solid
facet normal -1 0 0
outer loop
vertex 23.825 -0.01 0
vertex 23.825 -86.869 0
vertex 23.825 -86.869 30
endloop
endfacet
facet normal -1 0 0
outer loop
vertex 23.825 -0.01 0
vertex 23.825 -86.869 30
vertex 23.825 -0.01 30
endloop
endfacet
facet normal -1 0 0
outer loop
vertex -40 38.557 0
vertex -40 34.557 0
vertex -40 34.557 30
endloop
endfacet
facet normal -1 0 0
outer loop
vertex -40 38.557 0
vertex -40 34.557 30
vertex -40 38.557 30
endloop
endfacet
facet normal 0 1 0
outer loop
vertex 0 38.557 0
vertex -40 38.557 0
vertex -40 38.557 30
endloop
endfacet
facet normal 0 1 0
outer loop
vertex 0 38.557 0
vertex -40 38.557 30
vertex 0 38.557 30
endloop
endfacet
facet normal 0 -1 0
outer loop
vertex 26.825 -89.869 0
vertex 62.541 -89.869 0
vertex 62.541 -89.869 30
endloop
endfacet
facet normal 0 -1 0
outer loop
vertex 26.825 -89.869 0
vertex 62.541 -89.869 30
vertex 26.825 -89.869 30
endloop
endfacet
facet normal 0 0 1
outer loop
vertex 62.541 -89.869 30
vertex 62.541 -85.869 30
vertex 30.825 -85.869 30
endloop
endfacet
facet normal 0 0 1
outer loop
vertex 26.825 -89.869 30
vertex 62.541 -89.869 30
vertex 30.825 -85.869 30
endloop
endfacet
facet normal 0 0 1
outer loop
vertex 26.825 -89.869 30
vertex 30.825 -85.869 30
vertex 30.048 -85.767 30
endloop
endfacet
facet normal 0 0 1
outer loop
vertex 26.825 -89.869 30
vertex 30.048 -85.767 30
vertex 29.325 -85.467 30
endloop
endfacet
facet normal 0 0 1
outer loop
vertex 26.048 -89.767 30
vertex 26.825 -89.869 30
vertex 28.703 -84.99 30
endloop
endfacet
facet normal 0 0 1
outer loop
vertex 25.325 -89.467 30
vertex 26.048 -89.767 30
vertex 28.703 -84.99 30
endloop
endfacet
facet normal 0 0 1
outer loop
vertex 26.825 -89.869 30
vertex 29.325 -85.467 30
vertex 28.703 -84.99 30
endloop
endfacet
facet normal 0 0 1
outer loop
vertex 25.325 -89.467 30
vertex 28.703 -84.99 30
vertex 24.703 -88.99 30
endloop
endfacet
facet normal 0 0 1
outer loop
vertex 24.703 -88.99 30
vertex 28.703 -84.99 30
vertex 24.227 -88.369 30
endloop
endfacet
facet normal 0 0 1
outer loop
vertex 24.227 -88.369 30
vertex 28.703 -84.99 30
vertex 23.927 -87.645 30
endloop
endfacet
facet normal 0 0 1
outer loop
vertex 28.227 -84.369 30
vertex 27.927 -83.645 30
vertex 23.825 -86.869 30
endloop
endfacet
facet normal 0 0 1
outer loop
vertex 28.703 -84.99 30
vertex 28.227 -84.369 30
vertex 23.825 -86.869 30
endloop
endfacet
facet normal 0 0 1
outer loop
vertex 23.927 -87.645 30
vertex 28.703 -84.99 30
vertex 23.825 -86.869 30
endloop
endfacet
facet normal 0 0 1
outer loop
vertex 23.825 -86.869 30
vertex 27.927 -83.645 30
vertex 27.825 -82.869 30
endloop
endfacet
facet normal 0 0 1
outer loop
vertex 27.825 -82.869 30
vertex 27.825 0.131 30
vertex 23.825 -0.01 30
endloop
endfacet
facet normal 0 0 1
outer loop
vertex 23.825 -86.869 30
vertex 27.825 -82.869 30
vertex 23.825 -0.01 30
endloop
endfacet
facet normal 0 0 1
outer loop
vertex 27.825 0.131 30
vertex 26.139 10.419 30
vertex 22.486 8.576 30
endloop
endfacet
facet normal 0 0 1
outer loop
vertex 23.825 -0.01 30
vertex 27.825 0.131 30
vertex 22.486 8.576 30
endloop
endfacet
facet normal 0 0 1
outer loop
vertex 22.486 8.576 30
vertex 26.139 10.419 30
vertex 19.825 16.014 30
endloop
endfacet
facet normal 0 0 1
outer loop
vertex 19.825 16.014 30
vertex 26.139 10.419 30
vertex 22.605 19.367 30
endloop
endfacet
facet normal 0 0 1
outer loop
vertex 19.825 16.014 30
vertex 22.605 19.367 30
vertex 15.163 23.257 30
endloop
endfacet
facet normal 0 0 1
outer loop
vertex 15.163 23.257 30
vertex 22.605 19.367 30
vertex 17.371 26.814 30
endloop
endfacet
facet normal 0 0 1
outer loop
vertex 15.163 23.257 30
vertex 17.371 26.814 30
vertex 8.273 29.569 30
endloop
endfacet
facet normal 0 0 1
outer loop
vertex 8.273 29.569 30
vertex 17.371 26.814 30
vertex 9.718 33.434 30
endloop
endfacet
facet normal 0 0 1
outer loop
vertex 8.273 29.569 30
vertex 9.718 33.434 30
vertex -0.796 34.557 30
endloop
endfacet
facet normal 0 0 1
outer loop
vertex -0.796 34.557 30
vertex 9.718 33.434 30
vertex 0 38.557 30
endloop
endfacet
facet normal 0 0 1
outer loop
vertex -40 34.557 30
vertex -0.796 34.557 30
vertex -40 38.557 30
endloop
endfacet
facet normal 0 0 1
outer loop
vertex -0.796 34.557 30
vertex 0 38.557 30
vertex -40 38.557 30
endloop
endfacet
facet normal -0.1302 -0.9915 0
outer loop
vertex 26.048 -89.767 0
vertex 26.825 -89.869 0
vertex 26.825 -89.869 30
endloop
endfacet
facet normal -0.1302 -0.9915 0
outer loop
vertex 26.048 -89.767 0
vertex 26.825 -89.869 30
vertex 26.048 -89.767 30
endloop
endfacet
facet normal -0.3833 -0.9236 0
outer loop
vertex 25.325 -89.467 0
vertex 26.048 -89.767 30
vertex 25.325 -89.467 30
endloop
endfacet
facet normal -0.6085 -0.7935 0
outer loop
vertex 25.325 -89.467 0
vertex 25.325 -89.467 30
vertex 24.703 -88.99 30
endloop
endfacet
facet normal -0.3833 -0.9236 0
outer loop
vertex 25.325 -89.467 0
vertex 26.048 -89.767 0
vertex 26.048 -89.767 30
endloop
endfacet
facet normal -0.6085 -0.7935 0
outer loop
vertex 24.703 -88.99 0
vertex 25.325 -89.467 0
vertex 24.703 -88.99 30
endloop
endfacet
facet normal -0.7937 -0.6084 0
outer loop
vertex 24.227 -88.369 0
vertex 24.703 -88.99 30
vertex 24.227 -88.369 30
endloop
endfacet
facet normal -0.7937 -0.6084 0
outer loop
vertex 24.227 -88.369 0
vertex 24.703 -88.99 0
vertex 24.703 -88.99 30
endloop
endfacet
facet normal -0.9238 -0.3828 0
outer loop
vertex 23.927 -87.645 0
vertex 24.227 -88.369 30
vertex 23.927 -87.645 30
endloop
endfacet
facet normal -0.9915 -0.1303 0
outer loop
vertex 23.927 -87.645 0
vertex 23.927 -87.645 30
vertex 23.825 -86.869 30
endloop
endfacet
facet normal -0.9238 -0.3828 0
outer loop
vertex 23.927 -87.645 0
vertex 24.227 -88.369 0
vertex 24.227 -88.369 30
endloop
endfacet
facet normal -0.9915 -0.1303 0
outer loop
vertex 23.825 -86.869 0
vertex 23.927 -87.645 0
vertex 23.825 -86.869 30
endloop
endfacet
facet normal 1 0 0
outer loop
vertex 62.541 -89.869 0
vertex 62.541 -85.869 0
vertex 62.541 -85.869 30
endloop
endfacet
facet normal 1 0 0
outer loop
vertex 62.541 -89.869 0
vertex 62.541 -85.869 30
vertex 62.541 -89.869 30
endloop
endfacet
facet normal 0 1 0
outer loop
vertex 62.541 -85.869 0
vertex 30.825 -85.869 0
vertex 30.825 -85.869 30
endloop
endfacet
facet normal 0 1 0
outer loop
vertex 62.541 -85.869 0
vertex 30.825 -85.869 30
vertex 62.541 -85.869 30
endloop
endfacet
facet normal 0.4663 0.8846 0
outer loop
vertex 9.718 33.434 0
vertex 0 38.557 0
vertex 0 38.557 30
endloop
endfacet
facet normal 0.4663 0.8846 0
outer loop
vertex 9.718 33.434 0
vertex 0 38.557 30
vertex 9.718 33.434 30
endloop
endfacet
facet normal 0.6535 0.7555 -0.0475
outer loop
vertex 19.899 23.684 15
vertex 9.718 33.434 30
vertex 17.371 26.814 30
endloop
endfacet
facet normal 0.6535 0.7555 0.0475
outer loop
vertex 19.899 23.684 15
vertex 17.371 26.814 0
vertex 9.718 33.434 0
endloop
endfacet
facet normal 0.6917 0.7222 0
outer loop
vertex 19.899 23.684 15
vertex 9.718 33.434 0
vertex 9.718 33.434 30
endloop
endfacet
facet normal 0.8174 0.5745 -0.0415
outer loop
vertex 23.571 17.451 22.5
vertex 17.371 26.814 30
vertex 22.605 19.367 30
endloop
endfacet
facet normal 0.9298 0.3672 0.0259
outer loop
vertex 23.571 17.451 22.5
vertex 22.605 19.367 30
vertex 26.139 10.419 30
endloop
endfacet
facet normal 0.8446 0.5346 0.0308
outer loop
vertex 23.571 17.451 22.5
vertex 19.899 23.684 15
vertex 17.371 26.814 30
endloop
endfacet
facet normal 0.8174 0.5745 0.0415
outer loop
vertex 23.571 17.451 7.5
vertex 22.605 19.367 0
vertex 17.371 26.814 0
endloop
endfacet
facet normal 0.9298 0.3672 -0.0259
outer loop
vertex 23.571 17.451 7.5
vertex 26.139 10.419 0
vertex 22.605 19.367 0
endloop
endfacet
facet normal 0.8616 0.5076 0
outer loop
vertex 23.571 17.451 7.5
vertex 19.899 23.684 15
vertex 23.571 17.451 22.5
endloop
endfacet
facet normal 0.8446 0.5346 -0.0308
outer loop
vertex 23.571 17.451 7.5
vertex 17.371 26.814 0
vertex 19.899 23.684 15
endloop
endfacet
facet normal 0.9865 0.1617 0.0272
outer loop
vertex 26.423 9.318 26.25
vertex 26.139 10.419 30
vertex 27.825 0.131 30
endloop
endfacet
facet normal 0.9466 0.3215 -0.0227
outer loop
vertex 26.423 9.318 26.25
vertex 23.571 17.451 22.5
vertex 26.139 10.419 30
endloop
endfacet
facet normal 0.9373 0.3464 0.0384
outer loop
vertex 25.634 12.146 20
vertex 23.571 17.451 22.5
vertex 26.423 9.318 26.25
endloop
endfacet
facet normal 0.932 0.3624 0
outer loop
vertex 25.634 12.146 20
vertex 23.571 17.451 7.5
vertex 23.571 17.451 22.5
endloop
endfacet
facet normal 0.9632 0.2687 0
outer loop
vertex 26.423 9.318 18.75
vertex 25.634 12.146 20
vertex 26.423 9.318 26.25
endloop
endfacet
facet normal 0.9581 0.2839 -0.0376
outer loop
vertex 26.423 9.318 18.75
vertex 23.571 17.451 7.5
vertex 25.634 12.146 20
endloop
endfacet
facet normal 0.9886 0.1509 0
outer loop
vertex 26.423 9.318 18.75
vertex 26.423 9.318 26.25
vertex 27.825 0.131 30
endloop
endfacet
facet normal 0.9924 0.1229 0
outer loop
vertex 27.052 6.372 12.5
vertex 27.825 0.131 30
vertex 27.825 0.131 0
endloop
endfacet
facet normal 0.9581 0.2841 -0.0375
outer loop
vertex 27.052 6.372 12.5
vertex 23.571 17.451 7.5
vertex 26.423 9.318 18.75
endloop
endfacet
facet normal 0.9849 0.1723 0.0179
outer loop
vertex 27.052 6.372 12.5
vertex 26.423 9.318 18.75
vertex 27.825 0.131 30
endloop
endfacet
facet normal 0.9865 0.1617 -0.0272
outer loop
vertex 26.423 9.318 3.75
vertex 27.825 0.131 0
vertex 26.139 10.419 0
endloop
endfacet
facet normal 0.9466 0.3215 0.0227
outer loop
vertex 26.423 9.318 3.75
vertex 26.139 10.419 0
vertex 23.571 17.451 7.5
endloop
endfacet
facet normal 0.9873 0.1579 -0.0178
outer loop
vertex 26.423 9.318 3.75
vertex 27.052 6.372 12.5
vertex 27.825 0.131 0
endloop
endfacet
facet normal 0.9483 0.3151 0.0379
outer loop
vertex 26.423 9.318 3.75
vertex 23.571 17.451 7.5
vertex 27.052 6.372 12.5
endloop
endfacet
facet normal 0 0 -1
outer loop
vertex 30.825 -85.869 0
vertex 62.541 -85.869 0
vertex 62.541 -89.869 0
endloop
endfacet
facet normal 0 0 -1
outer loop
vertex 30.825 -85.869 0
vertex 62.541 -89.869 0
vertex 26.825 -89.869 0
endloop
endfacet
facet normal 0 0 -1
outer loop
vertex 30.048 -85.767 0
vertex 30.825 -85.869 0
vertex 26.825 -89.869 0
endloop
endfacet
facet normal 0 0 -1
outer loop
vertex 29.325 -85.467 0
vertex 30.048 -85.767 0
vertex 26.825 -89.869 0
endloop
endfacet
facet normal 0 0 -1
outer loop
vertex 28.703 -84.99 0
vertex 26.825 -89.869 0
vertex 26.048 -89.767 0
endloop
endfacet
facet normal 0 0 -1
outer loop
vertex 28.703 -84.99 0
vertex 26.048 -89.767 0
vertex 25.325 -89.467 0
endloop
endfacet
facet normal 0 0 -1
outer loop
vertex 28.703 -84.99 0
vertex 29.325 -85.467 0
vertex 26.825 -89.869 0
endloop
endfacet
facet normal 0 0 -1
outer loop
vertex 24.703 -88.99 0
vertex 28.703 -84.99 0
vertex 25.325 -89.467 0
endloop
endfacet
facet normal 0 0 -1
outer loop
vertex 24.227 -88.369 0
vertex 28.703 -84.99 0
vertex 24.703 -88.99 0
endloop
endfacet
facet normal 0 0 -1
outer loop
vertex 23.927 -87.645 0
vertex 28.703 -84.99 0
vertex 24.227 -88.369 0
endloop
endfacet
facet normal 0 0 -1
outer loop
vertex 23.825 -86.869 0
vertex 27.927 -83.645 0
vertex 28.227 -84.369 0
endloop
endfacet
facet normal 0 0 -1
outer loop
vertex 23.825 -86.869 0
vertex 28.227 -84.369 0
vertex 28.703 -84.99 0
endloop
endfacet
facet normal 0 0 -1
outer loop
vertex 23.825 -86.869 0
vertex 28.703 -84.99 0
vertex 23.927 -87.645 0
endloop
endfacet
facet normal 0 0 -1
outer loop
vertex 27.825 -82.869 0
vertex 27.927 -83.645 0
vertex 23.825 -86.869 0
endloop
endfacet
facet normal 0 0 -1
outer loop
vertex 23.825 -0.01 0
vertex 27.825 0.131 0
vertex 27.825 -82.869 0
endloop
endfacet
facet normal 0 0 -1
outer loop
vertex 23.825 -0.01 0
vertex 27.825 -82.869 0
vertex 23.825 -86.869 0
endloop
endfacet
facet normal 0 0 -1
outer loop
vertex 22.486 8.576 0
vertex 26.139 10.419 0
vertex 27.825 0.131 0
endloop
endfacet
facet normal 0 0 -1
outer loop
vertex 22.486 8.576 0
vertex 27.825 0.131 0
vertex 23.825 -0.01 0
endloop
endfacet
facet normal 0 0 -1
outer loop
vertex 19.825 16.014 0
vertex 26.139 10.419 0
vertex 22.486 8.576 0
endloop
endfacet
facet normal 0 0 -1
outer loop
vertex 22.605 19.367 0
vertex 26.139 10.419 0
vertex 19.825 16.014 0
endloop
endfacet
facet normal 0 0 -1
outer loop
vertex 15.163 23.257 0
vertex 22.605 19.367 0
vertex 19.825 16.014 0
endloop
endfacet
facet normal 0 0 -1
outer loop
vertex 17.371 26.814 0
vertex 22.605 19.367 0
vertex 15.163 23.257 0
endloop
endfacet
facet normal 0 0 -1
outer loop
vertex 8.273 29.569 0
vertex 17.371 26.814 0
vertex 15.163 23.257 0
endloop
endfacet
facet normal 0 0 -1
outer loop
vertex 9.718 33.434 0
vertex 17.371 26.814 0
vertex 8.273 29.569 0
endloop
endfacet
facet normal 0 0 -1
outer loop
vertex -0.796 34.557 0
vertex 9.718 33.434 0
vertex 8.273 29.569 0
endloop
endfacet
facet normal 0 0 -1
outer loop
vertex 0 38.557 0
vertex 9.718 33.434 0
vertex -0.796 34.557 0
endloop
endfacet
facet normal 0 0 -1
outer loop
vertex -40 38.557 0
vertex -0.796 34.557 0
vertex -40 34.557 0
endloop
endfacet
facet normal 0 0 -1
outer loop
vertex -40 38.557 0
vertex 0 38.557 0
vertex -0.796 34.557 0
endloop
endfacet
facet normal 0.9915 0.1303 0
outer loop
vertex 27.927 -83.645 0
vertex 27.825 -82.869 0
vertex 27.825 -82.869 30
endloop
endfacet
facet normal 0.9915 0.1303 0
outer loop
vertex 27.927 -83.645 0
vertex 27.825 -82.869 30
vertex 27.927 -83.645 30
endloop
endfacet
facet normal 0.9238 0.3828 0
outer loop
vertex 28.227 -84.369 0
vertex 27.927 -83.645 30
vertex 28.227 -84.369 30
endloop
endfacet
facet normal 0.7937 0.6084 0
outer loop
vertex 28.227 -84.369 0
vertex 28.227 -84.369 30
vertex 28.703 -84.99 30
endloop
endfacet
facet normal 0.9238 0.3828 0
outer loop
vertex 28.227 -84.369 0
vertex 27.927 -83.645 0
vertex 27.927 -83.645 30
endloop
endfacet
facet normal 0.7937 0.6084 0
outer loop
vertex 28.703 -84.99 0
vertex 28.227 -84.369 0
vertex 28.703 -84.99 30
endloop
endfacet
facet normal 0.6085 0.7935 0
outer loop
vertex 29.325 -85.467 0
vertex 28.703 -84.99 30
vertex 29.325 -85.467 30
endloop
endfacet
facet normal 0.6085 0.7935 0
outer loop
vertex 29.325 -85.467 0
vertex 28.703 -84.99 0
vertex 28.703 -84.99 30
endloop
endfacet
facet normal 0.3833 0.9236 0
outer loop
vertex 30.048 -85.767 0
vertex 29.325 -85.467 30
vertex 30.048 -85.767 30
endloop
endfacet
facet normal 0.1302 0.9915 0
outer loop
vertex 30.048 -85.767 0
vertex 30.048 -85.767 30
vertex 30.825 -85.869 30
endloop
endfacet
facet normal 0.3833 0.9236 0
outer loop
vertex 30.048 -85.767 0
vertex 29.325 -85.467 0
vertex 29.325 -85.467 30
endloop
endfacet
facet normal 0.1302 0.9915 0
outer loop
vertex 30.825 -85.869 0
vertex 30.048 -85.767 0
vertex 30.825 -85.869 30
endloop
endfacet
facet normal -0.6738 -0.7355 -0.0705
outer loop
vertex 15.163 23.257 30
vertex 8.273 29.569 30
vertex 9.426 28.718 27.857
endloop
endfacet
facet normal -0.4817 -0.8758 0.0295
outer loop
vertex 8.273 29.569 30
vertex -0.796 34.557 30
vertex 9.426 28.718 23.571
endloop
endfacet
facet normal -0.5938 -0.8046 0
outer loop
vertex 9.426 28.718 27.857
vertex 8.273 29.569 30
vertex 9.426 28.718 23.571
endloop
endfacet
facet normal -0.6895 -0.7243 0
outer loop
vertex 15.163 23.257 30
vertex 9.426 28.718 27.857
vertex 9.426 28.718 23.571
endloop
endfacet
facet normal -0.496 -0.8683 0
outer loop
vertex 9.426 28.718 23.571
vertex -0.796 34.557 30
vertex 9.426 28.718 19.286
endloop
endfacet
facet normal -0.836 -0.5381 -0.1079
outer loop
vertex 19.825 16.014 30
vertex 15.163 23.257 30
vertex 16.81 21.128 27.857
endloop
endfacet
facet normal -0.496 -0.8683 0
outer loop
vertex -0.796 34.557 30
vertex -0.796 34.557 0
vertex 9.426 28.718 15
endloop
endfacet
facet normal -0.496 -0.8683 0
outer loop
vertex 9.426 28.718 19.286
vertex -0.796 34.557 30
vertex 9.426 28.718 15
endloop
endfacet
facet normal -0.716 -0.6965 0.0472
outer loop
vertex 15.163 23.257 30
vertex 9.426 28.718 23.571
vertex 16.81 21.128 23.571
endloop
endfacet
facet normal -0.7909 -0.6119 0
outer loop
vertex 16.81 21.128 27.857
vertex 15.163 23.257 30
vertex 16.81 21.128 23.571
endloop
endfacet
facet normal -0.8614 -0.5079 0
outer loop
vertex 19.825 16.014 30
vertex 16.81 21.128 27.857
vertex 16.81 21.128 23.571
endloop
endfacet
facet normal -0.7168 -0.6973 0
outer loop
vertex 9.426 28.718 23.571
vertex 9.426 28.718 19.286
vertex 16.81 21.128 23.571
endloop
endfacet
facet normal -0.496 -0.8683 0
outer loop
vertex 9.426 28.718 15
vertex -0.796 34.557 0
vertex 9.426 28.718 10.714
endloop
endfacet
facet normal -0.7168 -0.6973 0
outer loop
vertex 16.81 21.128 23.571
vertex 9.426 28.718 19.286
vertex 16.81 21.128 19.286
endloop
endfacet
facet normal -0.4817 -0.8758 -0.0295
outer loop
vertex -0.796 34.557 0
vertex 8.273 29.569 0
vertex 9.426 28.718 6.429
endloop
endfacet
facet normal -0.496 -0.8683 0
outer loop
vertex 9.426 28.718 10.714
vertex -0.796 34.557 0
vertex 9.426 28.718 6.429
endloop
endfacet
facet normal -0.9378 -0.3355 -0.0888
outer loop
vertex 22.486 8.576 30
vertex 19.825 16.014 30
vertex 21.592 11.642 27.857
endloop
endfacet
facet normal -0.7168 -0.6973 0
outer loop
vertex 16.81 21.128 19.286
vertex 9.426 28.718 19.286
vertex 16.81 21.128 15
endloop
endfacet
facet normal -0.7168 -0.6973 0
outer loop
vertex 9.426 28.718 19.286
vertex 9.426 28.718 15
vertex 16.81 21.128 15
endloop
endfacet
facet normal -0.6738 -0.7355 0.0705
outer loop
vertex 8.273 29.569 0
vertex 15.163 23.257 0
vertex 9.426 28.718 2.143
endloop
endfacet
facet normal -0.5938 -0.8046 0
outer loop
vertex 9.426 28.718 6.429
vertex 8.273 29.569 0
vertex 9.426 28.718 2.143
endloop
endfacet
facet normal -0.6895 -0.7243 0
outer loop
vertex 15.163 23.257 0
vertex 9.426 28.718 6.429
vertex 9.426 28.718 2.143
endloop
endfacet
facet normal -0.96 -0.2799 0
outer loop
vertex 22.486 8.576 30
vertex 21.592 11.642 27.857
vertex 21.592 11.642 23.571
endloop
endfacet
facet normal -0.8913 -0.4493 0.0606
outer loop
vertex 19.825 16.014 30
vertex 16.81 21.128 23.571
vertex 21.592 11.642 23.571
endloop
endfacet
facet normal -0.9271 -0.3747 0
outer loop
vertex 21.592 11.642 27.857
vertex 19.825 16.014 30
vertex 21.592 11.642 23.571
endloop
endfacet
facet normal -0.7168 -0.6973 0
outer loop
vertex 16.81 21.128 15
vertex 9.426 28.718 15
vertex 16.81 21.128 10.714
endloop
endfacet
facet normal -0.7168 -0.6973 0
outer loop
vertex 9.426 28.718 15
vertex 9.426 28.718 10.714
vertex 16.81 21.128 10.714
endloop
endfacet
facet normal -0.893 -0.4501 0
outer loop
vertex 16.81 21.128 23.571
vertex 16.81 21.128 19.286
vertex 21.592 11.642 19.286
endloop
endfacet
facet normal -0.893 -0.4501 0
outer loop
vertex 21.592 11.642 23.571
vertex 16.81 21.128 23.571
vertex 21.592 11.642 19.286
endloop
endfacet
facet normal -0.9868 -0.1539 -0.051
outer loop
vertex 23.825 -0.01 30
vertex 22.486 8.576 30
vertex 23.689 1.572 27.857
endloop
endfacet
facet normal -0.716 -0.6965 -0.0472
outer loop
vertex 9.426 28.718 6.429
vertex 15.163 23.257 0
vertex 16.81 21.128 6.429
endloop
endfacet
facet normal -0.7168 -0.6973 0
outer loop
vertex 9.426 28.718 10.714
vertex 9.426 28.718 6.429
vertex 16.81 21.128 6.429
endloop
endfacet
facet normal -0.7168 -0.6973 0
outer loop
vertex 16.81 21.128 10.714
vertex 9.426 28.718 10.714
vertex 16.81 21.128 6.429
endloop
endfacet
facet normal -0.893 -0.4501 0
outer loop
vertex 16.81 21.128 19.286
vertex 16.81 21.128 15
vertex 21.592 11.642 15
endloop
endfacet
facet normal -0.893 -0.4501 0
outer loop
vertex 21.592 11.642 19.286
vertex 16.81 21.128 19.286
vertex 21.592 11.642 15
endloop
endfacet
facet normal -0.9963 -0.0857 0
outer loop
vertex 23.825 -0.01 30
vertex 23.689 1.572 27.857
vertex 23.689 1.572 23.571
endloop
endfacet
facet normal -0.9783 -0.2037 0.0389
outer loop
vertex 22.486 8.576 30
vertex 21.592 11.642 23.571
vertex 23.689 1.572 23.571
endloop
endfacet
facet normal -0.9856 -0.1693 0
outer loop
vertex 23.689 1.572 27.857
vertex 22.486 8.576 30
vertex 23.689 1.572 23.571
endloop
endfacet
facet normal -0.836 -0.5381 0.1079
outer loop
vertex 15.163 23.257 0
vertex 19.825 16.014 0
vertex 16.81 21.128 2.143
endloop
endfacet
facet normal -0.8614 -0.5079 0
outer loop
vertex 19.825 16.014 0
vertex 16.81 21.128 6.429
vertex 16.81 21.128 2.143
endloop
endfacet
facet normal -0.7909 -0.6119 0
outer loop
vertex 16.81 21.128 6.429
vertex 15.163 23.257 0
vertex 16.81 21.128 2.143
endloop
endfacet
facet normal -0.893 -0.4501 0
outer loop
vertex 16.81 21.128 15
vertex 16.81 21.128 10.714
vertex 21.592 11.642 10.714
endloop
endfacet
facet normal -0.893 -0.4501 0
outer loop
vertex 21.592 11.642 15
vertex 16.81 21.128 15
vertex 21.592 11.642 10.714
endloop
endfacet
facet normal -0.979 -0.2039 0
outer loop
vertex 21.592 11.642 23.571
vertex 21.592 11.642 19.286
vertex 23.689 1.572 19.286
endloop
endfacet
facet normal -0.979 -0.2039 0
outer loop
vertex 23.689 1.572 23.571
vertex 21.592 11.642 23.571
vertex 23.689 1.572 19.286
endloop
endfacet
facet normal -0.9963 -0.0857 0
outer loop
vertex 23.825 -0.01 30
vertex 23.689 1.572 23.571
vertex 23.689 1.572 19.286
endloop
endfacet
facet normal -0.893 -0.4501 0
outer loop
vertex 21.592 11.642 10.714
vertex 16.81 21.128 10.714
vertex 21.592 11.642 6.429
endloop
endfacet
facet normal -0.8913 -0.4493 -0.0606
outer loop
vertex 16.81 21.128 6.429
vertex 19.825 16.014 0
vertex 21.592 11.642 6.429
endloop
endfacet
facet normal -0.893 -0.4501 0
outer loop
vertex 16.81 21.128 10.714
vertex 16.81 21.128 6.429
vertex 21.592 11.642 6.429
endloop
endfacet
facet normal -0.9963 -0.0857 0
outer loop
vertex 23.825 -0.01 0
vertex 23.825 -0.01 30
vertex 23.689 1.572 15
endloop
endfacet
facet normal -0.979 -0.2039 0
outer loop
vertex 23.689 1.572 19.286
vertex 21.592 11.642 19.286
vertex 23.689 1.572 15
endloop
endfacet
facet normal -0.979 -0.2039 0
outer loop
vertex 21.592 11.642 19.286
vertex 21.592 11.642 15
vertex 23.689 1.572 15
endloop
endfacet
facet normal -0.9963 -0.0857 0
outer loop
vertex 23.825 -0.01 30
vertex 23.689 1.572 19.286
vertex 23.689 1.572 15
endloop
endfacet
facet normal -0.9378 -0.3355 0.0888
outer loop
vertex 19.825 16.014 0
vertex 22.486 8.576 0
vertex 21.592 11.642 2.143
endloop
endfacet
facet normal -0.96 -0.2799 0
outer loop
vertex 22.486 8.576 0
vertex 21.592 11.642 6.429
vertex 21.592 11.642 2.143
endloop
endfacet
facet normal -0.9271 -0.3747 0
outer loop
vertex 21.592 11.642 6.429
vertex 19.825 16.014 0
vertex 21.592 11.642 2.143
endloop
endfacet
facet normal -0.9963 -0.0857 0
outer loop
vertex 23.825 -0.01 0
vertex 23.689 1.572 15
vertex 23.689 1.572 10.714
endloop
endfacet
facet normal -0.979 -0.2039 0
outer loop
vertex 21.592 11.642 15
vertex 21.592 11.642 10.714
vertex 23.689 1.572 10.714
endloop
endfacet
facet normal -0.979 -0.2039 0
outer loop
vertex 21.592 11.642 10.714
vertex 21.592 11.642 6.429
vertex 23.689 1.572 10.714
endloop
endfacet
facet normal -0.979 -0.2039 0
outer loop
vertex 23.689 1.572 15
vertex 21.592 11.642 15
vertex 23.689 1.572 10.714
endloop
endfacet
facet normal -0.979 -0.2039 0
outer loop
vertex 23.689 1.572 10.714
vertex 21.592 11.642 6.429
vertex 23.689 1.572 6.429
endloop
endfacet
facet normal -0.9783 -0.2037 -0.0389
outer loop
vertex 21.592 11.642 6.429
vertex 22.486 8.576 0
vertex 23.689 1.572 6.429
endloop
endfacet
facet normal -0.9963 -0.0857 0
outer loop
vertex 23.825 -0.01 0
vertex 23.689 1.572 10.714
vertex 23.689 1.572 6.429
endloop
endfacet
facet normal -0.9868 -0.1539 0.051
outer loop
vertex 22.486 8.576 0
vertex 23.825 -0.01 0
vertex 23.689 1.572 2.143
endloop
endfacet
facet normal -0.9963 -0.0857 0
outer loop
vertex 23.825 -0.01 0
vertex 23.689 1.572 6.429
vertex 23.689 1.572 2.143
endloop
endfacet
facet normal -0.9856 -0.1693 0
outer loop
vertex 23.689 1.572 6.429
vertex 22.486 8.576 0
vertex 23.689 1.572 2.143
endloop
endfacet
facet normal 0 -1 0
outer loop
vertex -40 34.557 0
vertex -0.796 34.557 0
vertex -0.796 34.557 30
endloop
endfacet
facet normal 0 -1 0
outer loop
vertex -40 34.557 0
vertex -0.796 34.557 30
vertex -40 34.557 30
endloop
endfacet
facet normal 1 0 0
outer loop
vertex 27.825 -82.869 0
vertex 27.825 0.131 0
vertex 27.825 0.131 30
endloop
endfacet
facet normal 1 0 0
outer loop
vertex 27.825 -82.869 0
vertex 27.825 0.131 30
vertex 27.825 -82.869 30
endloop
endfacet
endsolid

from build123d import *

# Parameters (mm, degrees)
BOSS_EXTRUDE1_DEPTH = 30


with BuildPart() as part:
    # Sketch1 → Boss-Extrude1 (new body)
    with BuildSketch(Plane.XY):
        with BuildLine():
            Line((-40, 38.556946986), (0, 38.556946986))
            add(Edge.make_bspline(
                [(0, 38.556946986), (25.885340012, 28.023752492), (27.824600918, 0.131180898)],
                knots=[0, 0, 0, 1, 1, 1], degree=2))
            Line((27.824600918, 0.131180898), (27.824600918, -82.868819102))
            ThreePointArc((27.824600918, -82.868819102), (28.703280574, -84.990139445), (30.824600918, -85.868819102))
            Line((30.824600918, -85.868819102), (62.541306618, -85.868819102))
            Line((62.541306618, -85.868819102), (62.541306618, -89.868819102))
            Line((62.541306618, -89.868819102), (27.824600918, -89.868819102))
            Line((27.824600918, -89.868819102), (26.824600918, -89.868819102))
            ThreePointArc((26.824600918, -89.868819102), (24.703280574, -88.990139445), (23.824600918, -86.868819102))
            Line((23.824600918, -86.868819102), (23.824600918, -0.01001344))
            add(Edge.make_bspline(
                [(-0.796307781, 34.556946986), (-0.313071462, 34.352718519), (0.65471267, 33.927572325), (2.509371581, 33.047404589), (4.716407797, 31.874992229), (7.176880305, 30.35963937), (10.215802607, 28.194209311), (13.569039872, 25.21811291), (16.917231379, 21.206114841), (19.621581596, 16.724458997), (21.351620726, 12.565197335), (22.419479521, 8.964412879), (23.060246931, 6.124694742), (23.459149076, 3.637055451), (23.695469018, 1.580241662), (23.786657543, 0.517816431), (23.824600918, -0.01001344)],
                knots=[0.014797718, 0.014797718, 0.014797718, 0.014797718, 0.045503656, 0.076209593, 0.137621468, 0.199033343, 0.260445218, 0.383268968, 0.506092718, 0.628916468, 0.751740218, 0.813152093, 0.874563968, 0.935975843, 0.966681781, 0.997387718, 0.997387718, 0.997387718, 0.997387718], degree=3))
            Line((-0.796307781, 34.556946986), (-40, 34.556946986))
            Line((-40, 34.556946986), (-40, 38.556946986))
        make_face()
    extrude(amount=BOSS_EXTRUDE1_DEPTH)


solid = part.part
